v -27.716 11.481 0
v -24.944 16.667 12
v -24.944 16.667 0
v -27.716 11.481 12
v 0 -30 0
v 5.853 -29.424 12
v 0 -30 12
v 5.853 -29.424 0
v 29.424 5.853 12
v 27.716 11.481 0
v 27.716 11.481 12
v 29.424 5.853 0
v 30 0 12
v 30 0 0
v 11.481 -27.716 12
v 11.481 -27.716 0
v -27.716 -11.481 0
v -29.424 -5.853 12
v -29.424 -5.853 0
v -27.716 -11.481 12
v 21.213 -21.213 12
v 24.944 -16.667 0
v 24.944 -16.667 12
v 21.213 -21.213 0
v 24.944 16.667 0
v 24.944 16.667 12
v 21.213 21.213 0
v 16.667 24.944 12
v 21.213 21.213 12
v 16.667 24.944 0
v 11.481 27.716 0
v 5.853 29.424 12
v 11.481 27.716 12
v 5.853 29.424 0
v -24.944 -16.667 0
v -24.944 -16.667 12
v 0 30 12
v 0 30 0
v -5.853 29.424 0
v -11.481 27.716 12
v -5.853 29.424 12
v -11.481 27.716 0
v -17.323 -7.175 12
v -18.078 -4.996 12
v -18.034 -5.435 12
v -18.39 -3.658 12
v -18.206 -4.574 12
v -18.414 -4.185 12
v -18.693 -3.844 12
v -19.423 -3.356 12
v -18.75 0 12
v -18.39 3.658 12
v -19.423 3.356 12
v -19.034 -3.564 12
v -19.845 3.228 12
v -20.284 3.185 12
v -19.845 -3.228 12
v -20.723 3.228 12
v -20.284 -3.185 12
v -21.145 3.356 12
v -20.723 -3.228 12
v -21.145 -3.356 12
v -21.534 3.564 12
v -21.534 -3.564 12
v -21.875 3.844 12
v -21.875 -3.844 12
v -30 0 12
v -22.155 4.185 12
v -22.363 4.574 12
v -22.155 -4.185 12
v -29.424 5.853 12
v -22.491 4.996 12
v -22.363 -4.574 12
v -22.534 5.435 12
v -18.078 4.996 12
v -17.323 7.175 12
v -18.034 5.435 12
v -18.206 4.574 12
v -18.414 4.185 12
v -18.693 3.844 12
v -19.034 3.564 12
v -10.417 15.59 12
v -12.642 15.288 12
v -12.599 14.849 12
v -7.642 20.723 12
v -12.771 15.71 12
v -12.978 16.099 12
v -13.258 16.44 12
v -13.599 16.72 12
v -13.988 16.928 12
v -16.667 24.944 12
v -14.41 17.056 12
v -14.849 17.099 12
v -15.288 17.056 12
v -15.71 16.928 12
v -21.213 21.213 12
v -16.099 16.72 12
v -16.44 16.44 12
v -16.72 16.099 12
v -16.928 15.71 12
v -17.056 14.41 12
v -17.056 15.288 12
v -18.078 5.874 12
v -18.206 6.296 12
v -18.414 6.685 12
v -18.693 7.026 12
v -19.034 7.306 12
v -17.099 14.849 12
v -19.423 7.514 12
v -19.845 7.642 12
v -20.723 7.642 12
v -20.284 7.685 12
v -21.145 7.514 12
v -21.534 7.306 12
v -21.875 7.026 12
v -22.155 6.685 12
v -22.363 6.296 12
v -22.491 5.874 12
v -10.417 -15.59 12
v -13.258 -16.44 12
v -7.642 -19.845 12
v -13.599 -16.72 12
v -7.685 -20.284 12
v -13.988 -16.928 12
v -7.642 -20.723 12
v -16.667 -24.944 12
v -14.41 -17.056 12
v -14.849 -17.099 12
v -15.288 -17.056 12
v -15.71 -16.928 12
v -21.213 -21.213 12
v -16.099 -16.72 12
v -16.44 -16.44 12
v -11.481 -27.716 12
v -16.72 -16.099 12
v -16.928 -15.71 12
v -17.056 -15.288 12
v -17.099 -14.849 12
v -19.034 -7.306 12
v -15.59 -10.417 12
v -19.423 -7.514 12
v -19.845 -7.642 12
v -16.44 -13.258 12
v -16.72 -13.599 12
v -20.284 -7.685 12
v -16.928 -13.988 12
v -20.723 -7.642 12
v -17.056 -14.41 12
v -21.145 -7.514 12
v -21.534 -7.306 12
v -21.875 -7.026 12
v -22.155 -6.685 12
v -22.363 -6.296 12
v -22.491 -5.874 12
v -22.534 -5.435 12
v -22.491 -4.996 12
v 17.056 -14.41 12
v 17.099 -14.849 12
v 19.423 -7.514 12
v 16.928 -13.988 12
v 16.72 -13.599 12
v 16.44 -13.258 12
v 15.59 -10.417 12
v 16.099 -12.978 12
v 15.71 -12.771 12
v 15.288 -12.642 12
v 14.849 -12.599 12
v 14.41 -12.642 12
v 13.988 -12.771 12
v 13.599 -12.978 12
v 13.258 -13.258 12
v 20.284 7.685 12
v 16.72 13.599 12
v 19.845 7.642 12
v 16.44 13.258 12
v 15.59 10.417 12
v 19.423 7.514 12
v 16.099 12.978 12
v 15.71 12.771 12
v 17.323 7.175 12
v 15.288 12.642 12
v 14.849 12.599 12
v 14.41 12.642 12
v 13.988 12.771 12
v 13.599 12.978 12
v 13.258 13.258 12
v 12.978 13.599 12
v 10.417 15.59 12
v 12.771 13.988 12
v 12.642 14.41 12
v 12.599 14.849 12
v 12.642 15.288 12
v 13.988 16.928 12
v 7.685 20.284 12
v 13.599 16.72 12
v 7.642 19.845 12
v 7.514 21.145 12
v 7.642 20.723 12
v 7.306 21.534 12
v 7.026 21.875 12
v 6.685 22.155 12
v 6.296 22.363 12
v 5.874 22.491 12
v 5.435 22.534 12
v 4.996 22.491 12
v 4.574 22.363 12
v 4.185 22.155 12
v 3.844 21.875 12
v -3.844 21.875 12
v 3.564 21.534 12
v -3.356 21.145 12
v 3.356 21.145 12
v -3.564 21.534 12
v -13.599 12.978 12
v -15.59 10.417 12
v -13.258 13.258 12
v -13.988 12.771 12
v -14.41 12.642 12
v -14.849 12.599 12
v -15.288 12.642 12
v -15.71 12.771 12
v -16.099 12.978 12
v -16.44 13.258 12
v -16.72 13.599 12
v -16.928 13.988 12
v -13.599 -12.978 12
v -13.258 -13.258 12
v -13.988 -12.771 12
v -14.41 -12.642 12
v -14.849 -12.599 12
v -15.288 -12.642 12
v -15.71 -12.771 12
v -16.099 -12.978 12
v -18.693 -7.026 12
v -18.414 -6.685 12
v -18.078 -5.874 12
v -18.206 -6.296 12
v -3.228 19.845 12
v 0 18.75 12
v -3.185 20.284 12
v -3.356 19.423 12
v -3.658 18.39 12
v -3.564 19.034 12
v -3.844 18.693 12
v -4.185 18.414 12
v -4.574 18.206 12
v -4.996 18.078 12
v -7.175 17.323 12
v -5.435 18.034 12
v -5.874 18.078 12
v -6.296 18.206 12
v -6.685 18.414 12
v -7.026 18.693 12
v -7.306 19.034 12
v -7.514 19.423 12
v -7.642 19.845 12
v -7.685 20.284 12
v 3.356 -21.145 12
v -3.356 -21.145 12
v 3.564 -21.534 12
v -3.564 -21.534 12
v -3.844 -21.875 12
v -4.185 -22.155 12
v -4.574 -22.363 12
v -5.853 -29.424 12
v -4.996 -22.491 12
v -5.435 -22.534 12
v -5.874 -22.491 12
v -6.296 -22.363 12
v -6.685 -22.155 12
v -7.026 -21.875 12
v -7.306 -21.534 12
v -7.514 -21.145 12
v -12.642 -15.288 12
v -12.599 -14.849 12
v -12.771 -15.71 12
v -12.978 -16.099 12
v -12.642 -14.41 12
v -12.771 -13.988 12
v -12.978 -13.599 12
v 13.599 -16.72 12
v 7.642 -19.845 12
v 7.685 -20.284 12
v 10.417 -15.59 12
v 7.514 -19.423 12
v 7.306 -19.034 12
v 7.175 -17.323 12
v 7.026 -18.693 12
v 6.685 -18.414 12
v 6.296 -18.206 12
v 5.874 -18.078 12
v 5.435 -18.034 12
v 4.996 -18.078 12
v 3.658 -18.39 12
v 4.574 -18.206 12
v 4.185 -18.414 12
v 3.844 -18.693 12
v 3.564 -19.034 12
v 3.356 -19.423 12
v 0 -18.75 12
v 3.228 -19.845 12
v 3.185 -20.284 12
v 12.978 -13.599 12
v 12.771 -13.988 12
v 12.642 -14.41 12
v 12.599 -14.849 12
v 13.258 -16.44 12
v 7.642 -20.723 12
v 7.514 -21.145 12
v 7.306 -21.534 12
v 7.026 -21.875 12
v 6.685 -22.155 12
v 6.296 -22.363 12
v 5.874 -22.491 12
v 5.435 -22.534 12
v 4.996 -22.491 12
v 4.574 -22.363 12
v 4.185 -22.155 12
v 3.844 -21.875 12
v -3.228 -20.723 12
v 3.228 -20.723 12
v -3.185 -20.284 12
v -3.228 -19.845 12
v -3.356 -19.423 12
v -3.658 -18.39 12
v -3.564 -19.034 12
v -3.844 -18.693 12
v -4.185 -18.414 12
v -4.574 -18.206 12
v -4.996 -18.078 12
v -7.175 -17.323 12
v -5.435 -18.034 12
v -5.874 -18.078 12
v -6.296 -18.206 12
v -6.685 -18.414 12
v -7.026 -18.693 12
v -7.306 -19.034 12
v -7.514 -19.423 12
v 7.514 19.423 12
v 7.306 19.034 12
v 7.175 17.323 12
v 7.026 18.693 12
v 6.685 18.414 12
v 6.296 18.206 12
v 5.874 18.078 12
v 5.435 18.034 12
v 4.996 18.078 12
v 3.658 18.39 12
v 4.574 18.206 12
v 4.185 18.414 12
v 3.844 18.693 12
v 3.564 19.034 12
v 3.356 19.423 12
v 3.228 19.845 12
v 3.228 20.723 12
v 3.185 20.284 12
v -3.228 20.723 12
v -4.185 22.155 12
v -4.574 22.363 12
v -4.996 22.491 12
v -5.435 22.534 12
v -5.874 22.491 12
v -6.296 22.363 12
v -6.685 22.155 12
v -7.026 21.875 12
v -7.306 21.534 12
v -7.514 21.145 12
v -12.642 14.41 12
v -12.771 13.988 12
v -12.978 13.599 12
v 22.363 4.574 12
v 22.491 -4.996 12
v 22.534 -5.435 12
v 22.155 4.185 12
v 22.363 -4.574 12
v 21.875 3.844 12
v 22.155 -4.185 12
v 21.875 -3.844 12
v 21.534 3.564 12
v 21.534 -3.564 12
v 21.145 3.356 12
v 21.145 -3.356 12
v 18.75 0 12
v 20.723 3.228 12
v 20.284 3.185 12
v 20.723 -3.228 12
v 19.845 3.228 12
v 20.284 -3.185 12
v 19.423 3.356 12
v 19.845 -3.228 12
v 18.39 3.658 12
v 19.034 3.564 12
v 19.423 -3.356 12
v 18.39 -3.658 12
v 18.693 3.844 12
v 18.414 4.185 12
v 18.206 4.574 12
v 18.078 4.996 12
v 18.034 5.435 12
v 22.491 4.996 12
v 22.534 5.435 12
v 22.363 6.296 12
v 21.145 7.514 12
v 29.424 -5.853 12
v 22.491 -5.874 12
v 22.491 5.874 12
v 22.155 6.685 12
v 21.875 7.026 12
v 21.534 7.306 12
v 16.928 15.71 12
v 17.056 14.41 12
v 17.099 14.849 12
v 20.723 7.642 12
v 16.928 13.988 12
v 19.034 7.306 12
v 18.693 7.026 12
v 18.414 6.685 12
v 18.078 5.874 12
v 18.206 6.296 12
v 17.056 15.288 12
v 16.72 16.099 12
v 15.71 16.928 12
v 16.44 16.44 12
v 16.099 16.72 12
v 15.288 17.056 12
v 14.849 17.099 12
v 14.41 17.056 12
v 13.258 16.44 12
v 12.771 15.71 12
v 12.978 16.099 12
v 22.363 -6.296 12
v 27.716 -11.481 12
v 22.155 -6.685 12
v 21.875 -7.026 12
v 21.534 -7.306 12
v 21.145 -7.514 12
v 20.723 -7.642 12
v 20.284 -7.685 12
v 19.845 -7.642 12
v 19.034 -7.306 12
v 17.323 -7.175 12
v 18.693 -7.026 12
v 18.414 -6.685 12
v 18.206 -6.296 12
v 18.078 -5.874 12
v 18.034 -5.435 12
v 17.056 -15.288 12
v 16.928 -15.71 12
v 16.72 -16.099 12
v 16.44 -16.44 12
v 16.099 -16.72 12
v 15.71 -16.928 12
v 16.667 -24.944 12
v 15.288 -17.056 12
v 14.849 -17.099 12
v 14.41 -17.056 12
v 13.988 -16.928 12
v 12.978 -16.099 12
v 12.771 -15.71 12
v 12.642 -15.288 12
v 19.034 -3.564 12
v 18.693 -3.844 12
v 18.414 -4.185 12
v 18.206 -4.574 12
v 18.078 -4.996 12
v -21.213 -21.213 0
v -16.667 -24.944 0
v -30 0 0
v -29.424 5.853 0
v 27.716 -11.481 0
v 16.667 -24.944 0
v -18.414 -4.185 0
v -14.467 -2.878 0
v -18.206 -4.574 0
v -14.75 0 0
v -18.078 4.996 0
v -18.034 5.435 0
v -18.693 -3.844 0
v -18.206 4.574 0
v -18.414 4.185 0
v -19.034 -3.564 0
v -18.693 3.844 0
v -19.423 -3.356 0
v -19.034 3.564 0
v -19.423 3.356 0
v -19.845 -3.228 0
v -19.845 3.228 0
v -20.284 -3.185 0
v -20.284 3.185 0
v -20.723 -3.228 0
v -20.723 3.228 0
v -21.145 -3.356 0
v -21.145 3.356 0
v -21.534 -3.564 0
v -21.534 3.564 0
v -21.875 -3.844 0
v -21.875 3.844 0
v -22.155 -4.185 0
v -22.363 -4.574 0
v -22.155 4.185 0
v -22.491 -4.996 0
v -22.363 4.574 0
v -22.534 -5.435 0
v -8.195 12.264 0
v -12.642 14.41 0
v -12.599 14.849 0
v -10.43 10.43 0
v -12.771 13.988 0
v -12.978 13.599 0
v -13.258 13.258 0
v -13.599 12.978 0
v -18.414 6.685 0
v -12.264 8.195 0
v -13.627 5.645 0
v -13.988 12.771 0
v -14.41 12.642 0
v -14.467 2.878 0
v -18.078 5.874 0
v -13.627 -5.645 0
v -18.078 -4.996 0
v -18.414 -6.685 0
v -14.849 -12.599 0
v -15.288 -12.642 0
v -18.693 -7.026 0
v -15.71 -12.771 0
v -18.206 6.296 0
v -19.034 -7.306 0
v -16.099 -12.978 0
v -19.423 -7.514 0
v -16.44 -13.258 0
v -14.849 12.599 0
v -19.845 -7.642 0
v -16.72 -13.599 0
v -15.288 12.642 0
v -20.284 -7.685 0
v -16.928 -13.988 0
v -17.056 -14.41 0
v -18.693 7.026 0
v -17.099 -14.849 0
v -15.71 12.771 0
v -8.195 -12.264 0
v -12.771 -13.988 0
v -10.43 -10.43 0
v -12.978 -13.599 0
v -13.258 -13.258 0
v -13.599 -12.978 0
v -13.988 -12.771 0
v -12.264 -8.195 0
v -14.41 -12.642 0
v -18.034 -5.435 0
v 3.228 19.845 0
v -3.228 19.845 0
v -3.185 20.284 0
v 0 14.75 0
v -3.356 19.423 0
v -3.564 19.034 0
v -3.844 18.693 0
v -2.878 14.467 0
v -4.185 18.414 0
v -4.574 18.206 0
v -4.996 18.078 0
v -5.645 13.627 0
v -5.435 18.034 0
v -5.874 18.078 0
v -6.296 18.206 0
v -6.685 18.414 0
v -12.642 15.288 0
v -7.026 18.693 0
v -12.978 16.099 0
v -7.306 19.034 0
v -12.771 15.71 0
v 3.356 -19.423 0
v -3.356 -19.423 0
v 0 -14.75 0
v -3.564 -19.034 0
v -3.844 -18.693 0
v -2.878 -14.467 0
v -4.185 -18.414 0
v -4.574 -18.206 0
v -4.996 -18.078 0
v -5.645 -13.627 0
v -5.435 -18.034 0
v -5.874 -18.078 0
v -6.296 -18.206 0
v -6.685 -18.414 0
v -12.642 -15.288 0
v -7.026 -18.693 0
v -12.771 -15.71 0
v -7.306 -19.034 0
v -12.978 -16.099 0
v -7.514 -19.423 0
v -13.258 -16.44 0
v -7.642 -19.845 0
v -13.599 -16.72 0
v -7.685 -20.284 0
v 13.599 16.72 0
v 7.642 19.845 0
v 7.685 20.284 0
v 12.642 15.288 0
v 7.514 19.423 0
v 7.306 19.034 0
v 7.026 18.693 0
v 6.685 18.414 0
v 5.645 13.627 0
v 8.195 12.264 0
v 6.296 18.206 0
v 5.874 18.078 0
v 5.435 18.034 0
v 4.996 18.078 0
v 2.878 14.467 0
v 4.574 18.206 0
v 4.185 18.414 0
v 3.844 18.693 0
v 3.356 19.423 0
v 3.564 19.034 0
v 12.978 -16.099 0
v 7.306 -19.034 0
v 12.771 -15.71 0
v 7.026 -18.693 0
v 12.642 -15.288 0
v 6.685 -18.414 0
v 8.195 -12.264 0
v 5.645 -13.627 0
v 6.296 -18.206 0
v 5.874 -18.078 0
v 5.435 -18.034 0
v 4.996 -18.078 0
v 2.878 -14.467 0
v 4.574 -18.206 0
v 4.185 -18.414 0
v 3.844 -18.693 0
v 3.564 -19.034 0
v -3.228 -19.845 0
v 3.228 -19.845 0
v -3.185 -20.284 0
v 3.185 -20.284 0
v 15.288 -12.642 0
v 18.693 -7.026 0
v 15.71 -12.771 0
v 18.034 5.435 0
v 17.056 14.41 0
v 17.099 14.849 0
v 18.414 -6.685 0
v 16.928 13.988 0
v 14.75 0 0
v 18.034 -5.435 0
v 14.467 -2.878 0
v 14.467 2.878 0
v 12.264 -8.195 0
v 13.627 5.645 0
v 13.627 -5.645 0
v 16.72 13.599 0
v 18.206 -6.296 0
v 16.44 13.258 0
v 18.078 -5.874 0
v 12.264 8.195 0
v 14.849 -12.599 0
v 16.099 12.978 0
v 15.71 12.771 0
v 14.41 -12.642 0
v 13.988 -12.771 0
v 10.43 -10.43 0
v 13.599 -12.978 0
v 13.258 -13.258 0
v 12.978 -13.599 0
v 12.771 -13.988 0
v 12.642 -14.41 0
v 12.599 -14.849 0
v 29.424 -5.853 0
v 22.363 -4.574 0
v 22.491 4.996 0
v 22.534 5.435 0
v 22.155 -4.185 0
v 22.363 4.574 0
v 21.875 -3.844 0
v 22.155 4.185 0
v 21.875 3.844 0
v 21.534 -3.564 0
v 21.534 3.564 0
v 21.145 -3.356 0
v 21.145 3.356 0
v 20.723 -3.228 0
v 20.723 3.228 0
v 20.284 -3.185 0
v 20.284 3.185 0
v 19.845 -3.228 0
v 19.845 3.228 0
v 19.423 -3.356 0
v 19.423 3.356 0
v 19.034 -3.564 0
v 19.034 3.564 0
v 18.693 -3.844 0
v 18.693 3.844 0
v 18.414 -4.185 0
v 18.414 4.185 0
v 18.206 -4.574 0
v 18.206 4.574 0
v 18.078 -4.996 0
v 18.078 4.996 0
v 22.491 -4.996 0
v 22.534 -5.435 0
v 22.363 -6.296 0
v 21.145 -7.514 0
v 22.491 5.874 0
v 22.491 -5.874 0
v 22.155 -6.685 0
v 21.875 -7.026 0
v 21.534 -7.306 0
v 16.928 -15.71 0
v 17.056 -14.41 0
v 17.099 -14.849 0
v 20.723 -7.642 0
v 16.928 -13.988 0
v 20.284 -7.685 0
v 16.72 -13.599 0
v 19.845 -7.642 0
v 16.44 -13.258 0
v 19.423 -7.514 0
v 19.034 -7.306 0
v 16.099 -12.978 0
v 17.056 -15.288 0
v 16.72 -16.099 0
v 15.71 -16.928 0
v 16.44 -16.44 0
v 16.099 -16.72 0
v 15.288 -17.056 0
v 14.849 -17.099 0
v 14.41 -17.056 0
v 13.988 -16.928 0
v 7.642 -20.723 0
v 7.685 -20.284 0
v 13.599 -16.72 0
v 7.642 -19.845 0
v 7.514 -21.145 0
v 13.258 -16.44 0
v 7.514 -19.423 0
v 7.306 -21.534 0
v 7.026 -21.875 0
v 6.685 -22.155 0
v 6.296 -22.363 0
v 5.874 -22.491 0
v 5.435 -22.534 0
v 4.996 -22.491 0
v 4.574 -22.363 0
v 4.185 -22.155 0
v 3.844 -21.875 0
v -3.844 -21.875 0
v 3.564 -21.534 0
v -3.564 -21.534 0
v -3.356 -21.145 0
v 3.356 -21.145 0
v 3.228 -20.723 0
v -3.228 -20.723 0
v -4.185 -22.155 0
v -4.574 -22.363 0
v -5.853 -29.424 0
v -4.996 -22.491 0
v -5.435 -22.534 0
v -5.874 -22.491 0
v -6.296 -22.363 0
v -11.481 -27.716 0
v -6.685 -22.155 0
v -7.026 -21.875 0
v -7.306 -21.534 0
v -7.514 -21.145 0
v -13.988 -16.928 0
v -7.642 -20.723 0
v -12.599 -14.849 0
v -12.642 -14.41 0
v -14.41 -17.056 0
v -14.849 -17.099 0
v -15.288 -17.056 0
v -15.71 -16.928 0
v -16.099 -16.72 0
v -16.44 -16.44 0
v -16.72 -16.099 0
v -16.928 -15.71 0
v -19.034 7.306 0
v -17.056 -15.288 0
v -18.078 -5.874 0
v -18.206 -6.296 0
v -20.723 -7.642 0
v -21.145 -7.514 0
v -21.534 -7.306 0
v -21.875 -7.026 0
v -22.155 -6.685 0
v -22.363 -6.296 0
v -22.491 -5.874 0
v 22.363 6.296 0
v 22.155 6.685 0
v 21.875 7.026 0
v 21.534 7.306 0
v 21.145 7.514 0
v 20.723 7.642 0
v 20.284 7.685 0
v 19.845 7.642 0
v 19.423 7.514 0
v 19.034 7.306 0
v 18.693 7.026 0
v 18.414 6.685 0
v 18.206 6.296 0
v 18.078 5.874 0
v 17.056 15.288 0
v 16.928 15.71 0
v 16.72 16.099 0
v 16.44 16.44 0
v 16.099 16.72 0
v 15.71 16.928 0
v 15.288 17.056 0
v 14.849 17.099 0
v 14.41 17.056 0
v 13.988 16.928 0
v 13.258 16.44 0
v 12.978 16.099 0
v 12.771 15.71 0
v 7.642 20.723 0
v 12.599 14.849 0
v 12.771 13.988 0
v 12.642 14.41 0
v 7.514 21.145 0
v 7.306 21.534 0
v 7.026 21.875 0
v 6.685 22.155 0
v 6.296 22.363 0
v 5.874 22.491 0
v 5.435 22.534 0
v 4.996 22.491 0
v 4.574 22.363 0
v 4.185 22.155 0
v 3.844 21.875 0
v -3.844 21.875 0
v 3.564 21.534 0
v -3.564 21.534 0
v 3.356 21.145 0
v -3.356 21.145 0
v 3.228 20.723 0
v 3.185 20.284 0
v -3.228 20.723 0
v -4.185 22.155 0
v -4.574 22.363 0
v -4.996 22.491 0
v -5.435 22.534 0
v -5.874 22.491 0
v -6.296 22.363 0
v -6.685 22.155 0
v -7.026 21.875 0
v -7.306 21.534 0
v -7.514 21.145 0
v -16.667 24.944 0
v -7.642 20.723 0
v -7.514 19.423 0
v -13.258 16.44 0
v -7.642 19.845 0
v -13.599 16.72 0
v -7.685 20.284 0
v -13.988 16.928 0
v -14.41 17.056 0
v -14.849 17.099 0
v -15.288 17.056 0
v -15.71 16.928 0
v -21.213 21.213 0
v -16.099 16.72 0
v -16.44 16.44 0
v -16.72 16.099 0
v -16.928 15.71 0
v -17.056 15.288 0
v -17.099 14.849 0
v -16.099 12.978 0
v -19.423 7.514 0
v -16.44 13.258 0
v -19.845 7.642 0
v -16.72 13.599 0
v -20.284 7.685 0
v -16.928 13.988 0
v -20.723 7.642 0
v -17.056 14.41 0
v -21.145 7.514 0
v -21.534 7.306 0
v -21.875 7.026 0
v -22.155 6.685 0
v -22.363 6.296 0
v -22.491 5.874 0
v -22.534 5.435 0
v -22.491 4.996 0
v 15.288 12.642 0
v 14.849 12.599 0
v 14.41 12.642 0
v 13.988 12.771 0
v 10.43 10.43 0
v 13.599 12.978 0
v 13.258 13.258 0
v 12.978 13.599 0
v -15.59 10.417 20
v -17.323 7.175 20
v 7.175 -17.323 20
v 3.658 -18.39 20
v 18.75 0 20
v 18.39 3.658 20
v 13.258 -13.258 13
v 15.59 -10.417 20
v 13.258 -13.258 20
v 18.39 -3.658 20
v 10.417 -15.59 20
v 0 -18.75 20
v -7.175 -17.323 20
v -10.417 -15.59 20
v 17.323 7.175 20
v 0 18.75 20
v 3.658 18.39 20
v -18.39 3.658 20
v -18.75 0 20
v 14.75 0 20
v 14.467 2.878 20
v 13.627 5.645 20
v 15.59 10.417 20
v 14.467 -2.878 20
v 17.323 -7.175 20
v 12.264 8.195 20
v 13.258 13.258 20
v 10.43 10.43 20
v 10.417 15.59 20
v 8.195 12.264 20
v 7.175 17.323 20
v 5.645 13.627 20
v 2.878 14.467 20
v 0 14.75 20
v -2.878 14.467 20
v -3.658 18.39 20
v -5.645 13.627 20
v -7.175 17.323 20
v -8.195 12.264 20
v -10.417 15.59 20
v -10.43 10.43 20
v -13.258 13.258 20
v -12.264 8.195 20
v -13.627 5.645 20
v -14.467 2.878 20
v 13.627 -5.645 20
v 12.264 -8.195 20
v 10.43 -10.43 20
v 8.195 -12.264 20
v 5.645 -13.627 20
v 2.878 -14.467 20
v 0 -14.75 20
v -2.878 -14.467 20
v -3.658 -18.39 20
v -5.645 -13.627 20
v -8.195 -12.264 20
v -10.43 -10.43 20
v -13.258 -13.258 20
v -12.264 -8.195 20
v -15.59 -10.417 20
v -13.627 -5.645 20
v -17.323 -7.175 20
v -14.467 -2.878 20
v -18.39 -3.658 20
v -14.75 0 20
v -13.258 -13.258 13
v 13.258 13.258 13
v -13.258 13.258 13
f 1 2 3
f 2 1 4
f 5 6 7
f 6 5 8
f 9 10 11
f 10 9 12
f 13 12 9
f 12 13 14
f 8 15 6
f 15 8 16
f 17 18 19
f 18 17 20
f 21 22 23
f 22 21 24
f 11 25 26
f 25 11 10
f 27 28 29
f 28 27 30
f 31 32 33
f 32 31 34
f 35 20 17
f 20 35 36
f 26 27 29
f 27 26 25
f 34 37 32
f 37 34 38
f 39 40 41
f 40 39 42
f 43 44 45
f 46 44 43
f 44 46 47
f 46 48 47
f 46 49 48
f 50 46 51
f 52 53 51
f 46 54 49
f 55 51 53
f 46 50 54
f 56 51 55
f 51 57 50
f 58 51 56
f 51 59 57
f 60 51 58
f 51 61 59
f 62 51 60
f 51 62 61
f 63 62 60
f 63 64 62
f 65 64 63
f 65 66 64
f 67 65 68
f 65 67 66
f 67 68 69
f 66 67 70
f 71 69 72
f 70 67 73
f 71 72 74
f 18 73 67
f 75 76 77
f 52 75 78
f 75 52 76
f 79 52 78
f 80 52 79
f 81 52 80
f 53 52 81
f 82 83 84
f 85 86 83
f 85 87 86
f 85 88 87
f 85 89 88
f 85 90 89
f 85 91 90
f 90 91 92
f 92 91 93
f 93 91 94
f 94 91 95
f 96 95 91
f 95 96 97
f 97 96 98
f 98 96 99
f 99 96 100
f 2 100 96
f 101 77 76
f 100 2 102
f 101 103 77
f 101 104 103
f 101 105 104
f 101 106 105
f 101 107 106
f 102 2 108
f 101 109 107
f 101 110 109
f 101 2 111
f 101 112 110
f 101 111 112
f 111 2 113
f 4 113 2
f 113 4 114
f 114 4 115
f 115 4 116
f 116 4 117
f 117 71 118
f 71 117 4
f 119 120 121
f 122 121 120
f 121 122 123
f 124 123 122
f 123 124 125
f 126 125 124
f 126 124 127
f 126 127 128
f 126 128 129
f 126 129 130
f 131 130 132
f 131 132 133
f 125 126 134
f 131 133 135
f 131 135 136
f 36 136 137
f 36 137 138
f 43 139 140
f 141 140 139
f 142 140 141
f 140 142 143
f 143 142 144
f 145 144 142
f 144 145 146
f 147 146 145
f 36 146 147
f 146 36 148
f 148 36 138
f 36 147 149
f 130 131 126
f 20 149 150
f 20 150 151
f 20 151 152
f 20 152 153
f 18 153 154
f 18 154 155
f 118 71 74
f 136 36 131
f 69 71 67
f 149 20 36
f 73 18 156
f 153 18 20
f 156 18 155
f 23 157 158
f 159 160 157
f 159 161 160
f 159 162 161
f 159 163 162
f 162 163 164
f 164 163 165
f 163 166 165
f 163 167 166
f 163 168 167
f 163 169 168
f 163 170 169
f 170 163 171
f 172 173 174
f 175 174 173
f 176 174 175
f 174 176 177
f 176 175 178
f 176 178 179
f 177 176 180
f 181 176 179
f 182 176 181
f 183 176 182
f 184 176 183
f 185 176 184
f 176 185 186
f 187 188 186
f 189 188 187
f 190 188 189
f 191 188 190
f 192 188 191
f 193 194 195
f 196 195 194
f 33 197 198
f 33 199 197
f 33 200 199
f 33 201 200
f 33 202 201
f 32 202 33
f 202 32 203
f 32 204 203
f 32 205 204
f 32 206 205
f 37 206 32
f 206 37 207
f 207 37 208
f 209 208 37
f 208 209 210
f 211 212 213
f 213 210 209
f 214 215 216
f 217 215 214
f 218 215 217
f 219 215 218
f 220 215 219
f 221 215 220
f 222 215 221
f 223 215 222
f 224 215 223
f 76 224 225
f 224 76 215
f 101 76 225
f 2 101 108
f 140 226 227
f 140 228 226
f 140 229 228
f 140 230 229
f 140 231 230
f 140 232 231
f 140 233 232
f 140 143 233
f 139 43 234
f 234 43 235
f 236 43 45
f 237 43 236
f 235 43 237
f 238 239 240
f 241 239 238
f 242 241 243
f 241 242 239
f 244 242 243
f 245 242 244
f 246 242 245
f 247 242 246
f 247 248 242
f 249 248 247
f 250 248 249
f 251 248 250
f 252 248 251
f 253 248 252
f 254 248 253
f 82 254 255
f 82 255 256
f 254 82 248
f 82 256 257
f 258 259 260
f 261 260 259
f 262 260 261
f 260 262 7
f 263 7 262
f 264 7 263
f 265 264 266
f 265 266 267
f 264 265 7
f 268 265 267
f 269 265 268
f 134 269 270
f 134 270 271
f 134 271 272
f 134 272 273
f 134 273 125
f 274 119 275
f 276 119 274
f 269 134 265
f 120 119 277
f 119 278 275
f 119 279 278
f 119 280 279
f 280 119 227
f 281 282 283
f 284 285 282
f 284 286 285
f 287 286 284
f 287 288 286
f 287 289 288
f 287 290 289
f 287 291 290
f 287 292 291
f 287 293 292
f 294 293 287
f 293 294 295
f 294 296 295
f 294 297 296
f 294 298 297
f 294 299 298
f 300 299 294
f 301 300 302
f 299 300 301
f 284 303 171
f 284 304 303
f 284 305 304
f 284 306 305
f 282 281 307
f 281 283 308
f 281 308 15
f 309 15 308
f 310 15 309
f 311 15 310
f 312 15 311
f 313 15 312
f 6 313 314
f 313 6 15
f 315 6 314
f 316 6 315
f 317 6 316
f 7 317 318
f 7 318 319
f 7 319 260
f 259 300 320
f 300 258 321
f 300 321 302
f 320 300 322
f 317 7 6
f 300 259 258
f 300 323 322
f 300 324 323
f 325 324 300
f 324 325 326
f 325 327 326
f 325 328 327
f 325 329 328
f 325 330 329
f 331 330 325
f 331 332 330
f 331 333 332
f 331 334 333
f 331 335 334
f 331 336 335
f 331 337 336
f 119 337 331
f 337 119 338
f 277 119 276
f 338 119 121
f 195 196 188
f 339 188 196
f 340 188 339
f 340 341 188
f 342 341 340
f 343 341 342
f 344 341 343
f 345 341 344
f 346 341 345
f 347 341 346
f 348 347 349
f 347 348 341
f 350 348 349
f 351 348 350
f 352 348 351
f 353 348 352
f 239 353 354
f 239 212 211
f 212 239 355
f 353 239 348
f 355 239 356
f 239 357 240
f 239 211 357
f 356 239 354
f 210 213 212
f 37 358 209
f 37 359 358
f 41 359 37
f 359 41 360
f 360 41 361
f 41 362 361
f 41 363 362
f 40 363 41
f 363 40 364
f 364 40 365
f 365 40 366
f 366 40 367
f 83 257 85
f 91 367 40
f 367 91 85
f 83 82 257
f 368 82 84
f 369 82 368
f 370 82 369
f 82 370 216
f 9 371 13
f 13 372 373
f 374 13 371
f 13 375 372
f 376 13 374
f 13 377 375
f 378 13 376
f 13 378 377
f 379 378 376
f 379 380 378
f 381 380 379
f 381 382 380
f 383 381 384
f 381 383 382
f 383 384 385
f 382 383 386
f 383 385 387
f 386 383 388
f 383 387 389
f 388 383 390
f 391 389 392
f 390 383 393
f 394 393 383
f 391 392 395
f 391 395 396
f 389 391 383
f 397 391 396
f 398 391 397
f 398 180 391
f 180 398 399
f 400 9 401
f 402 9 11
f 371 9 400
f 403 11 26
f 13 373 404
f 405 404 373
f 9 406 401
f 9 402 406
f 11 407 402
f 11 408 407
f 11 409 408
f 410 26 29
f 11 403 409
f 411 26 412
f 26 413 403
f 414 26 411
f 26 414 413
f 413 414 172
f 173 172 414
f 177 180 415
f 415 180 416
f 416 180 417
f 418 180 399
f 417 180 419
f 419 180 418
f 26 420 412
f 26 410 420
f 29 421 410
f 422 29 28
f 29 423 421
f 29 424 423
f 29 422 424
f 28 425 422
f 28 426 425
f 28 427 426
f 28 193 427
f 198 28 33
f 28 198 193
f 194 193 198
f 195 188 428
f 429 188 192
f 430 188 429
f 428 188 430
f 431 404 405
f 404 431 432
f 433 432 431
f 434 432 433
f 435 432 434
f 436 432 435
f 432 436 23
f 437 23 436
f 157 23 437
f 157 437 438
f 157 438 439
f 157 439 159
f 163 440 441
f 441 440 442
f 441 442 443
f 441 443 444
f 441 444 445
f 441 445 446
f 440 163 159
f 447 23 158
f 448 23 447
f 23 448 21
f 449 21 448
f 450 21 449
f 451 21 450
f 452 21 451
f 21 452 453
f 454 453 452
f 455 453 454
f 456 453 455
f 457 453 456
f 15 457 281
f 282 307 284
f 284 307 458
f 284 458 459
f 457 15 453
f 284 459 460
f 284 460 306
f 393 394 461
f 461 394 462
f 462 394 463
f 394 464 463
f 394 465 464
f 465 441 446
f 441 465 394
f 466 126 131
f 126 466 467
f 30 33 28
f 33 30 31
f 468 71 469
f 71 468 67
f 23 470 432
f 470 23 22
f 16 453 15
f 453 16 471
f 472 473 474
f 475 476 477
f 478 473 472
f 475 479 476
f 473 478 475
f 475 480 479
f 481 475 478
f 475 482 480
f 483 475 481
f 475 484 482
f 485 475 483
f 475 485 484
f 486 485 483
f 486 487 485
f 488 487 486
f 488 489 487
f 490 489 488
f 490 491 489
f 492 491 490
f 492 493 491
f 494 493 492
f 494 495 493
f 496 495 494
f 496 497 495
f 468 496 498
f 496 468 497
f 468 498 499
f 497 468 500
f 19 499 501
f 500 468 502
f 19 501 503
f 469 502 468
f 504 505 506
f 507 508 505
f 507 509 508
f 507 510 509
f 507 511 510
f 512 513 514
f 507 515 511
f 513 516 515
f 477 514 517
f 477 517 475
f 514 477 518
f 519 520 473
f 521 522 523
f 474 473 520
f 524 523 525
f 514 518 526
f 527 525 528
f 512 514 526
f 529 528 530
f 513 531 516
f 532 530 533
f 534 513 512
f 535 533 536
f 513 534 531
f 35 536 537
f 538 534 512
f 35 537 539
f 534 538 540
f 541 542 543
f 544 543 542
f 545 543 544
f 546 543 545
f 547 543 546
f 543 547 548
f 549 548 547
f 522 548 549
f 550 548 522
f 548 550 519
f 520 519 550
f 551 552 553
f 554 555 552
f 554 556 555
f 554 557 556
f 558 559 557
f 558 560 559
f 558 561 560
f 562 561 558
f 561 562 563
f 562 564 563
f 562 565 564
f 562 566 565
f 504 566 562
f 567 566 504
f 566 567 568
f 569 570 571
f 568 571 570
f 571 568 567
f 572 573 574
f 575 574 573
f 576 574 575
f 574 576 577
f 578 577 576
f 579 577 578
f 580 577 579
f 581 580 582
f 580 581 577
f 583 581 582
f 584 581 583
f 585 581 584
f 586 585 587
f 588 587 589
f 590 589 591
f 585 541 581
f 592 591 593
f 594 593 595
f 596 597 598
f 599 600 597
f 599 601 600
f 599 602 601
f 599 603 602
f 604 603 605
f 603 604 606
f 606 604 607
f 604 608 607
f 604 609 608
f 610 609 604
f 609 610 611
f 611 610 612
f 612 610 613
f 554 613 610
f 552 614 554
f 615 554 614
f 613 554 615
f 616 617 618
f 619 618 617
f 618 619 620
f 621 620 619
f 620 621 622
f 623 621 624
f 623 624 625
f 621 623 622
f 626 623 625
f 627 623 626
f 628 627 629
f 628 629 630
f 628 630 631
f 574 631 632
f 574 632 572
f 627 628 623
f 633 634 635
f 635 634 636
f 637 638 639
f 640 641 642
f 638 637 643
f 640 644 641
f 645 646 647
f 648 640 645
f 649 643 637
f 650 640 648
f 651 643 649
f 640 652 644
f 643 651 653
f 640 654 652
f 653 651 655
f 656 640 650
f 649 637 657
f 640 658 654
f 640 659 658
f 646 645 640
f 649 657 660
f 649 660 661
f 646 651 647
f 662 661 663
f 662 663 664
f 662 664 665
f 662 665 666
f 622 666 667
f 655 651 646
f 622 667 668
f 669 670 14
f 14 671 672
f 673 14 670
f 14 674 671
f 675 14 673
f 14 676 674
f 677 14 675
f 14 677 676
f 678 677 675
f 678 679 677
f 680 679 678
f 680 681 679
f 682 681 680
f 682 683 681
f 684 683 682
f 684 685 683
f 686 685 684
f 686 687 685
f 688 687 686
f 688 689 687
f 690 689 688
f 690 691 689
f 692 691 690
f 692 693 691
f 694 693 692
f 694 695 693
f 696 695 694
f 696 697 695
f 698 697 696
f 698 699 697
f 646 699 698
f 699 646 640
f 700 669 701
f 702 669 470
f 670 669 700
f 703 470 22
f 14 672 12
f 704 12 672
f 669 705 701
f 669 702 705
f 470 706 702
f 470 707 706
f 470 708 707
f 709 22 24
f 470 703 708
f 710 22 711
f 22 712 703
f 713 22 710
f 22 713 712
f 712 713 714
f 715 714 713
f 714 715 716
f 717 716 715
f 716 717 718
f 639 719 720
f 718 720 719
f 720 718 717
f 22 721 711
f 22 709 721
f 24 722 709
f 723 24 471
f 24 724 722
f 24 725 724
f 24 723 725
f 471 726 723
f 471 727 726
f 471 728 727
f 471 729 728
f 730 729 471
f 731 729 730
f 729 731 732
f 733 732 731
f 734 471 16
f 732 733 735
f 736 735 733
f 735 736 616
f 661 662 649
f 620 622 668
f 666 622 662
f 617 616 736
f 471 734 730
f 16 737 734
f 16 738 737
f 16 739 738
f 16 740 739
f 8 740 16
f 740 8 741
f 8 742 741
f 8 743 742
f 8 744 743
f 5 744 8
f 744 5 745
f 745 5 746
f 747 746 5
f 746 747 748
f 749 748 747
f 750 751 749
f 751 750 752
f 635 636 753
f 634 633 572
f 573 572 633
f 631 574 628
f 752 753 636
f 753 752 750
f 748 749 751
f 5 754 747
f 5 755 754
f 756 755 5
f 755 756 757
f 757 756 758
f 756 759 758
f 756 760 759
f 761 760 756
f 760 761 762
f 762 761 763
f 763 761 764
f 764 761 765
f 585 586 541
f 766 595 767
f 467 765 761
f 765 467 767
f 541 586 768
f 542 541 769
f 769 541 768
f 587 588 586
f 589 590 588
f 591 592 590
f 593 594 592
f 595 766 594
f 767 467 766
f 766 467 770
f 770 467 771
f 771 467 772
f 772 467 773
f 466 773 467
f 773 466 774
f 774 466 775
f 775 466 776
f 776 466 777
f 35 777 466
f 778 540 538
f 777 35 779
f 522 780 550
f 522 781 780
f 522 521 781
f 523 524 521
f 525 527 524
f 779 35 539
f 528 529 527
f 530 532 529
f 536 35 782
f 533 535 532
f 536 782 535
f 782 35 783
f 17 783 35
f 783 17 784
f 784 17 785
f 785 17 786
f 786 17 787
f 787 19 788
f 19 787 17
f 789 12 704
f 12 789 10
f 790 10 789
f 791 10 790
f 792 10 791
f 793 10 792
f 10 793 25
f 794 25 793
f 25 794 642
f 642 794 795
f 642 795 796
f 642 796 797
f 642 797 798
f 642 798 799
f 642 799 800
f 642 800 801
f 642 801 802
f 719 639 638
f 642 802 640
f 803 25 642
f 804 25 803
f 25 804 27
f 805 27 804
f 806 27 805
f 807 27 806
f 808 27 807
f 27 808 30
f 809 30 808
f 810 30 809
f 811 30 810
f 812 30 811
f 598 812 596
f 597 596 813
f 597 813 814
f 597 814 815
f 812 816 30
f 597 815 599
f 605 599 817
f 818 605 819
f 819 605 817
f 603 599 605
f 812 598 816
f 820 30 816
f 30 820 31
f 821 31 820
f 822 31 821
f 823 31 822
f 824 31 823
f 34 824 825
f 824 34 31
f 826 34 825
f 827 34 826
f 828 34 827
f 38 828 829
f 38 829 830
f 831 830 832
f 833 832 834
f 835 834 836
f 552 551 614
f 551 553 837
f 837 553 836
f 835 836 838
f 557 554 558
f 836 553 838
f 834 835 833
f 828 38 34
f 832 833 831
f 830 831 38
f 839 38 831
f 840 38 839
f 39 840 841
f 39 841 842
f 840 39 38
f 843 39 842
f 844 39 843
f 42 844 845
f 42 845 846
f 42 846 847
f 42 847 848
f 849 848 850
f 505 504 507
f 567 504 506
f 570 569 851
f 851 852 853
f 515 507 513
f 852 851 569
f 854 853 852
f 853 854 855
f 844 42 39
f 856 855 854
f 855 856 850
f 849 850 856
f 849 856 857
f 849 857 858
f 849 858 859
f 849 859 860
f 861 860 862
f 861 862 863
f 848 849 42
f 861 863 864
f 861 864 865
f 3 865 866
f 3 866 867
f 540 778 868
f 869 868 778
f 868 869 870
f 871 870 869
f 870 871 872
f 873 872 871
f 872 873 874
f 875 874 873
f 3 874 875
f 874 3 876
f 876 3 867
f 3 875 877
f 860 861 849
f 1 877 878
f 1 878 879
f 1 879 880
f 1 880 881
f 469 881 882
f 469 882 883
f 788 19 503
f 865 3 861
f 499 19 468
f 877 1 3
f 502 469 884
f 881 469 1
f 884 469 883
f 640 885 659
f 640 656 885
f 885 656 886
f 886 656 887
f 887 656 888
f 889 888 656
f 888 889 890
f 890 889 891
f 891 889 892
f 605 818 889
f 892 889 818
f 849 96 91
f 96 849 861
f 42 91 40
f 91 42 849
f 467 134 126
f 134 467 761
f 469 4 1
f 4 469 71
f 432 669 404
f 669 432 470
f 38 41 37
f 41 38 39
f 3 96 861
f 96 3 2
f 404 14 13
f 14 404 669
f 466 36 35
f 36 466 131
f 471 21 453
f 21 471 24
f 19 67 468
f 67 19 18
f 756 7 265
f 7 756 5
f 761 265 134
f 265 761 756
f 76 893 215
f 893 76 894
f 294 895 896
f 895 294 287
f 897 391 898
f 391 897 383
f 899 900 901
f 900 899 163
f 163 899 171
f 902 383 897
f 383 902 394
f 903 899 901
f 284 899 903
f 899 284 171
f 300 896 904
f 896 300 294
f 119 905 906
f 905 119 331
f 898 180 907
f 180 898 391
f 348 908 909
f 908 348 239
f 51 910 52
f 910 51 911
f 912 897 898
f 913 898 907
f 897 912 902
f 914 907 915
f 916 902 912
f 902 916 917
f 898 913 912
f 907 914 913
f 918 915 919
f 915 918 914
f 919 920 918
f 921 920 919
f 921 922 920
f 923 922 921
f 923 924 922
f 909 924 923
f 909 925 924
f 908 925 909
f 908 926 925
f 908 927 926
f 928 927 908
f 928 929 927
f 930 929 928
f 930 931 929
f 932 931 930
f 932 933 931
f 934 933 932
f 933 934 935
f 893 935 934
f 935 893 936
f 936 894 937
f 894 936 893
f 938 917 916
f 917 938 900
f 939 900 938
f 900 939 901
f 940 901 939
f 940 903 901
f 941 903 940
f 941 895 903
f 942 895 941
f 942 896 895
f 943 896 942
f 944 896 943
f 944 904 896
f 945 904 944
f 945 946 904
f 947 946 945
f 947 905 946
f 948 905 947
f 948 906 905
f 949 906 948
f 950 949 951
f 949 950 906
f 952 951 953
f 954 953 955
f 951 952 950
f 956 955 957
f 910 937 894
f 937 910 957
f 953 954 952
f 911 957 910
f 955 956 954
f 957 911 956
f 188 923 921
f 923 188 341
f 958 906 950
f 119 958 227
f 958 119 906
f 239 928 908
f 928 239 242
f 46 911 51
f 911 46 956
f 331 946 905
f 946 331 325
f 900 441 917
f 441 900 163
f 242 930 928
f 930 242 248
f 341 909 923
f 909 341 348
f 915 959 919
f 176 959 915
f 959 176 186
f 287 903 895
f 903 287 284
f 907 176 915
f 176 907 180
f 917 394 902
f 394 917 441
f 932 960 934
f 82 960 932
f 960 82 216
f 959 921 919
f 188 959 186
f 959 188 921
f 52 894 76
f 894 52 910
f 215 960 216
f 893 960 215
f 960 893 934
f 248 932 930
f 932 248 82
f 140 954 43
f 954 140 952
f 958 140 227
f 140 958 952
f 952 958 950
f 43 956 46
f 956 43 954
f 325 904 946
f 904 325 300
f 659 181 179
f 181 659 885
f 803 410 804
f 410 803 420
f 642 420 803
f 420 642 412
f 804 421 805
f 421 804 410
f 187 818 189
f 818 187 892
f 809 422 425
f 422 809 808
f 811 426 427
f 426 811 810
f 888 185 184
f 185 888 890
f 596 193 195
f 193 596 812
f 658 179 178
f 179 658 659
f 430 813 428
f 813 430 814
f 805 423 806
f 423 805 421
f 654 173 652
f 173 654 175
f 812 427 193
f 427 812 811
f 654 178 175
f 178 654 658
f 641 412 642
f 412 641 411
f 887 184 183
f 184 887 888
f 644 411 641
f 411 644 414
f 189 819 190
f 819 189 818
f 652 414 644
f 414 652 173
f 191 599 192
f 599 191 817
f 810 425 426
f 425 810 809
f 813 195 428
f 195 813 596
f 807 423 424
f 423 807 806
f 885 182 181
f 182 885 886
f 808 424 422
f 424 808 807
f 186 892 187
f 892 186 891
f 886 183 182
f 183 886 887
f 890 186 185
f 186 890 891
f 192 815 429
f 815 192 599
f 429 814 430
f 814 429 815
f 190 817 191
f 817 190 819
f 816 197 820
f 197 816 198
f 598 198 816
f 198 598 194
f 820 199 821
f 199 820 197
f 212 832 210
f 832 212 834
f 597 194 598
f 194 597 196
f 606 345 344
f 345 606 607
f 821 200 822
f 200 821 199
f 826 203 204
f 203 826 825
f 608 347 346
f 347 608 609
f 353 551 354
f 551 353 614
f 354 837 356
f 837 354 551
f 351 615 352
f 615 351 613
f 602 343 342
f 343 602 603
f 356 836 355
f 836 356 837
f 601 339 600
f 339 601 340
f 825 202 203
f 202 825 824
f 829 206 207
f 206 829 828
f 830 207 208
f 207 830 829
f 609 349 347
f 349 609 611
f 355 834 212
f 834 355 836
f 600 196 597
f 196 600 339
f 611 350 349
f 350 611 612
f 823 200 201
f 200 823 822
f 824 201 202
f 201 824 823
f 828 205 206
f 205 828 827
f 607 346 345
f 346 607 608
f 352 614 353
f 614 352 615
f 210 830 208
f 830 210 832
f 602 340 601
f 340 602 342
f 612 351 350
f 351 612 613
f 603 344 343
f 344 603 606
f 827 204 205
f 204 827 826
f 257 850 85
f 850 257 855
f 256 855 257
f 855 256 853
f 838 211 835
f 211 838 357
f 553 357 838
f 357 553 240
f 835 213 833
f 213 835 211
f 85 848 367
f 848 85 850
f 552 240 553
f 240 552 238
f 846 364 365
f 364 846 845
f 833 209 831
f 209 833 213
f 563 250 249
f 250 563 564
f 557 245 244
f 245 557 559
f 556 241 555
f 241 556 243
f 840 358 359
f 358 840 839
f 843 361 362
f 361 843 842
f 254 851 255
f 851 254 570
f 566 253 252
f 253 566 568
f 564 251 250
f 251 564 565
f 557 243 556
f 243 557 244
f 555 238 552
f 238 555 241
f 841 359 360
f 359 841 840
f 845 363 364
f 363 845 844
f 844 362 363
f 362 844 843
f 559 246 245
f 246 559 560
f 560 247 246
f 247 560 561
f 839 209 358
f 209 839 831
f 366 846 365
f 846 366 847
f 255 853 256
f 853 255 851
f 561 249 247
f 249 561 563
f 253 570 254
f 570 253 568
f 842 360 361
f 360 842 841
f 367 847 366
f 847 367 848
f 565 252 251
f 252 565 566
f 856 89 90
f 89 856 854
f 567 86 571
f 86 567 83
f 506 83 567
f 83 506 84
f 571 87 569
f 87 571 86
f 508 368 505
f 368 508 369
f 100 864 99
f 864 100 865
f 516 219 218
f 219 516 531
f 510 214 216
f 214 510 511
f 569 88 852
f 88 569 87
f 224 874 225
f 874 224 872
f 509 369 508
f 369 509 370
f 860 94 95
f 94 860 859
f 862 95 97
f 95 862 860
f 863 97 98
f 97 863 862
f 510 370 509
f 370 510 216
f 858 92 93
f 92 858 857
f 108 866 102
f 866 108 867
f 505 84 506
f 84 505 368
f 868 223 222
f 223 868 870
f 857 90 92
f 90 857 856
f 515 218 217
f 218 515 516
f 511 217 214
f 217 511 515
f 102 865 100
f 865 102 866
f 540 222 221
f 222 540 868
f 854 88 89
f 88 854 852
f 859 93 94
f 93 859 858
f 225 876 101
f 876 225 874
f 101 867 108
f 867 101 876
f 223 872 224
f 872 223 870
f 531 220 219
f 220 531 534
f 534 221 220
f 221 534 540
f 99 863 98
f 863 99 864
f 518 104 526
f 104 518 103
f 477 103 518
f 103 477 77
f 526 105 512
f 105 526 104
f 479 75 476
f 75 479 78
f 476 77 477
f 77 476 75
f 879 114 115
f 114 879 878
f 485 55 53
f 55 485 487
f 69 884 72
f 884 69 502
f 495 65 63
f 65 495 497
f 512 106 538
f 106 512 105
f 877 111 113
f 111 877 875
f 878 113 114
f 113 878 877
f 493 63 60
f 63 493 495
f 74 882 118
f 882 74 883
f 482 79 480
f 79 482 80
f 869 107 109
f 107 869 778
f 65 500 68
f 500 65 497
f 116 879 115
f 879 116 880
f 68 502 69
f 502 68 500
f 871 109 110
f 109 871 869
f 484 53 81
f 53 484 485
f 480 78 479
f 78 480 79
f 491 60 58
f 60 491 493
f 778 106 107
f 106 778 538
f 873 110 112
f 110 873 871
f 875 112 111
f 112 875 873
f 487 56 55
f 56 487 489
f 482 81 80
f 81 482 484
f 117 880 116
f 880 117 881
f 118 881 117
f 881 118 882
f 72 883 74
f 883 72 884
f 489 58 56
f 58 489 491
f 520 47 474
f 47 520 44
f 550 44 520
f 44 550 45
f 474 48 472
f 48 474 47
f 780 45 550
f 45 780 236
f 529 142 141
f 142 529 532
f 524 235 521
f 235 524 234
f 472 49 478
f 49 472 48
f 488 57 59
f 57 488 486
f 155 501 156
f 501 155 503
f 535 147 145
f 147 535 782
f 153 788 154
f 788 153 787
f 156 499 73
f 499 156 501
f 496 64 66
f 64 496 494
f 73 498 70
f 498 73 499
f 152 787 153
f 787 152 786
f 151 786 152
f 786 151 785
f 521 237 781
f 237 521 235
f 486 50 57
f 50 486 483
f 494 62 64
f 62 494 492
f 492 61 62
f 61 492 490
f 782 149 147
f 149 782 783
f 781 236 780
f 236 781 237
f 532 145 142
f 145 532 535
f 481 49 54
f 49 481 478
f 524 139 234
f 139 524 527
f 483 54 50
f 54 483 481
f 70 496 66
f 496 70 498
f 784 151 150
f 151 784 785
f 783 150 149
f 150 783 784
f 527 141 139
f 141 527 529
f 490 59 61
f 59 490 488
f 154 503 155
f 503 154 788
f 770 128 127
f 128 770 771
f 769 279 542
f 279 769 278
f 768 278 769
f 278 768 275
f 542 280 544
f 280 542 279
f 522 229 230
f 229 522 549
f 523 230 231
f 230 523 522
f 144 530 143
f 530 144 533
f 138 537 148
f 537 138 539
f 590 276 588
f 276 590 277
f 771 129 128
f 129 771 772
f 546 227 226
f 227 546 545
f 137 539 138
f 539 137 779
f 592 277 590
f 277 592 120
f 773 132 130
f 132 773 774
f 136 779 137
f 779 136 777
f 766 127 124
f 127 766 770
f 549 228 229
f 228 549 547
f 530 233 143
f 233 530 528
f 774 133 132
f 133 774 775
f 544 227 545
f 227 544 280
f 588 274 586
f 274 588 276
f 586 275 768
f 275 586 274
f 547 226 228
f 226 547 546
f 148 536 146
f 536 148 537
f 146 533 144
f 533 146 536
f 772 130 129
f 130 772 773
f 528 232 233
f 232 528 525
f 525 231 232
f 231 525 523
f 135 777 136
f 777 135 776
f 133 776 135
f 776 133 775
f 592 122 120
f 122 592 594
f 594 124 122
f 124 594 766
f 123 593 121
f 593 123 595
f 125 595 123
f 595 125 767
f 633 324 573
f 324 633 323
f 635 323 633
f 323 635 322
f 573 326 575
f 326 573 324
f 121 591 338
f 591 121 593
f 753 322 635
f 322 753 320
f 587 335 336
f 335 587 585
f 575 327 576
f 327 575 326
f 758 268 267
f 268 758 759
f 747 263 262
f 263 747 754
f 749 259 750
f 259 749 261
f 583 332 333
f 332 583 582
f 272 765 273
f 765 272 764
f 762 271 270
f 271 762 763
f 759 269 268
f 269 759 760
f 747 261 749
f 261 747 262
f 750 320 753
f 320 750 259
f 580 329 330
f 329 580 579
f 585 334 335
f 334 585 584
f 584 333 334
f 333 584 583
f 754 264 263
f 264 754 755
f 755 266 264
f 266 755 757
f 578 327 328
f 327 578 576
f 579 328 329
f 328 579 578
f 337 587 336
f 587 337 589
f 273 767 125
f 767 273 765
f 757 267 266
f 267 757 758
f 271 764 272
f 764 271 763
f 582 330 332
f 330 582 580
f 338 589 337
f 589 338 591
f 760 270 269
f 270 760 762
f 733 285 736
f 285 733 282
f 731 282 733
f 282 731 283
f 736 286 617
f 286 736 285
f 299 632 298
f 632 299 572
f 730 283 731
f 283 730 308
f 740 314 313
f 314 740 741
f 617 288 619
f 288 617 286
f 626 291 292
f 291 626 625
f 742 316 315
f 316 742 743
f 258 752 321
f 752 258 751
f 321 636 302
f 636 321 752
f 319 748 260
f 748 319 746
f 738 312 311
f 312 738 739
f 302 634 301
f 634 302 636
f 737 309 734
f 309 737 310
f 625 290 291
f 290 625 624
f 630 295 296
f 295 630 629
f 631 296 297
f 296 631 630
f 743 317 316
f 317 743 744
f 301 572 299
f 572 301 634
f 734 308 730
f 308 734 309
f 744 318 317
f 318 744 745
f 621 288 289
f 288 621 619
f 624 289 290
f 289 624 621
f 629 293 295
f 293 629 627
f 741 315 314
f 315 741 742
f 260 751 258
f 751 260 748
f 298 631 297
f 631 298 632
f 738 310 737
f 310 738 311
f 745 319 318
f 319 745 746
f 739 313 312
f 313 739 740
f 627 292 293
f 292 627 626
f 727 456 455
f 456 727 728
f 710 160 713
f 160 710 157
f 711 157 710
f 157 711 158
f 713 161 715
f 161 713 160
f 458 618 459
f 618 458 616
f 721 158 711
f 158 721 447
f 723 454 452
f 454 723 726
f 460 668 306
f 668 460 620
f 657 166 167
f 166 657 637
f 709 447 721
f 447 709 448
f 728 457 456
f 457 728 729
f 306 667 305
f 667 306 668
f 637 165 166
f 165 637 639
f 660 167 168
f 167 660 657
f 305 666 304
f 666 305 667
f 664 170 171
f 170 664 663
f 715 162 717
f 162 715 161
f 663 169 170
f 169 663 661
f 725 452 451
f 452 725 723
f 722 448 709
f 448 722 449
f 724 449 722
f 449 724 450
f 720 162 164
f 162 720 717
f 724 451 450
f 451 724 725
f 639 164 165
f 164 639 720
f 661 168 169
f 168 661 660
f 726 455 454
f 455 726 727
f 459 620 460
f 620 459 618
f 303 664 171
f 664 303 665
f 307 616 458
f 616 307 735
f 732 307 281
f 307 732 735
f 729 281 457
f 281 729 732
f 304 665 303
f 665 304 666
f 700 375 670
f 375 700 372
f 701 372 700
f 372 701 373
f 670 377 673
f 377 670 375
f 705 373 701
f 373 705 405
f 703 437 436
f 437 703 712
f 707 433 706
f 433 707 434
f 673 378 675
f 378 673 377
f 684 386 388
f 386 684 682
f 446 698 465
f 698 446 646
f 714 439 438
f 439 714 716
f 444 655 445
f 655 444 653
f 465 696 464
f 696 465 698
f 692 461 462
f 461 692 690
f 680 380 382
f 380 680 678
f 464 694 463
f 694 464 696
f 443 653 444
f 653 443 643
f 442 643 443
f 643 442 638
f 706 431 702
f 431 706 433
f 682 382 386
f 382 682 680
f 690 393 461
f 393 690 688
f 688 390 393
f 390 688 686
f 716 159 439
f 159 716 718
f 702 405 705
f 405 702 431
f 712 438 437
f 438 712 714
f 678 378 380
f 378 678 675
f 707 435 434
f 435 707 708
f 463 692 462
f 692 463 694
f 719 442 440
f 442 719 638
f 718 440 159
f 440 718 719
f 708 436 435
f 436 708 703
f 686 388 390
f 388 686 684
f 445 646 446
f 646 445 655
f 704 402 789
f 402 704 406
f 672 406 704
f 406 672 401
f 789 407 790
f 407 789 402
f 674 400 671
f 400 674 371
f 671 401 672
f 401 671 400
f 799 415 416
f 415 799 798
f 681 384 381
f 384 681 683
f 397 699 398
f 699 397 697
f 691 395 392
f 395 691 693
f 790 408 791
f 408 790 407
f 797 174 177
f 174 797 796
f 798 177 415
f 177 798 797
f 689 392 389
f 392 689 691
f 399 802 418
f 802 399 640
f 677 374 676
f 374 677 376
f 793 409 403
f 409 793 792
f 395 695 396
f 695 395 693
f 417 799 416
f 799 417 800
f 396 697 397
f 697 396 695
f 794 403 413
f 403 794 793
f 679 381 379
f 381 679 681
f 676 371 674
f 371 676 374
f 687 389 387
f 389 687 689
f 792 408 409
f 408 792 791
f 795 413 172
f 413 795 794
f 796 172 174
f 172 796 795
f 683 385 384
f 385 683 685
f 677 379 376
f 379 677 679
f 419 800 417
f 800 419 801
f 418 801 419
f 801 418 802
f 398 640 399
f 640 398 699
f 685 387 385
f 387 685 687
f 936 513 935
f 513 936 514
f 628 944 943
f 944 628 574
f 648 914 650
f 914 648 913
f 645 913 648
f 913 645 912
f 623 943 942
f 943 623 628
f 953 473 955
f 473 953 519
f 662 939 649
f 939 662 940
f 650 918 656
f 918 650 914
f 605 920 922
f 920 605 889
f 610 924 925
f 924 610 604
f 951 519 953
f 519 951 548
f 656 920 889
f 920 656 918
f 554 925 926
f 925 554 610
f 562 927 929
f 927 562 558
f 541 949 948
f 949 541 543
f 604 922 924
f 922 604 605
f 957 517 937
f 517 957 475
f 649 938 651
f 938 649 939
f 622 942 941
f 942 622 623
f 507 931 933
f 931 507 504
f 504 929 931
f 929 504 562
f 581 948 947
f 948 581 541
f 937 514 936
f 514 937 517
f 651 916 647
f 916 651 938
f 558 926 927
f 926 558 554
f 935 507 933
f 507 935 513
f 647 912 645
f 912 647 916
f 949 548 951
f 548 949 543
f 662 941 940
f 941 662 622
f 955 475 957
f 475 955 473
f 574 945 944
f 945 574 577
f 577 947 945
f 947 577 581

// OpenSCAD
$fn = 32;

// ----------------------------------------------------------------------
// Flange Ø60 x 12
// 12 holes on a Ø42 bolt circle, bolted joints
// ----------------------------------------------------------------------

// --- parameters (mm) ---
flange_d = 60;   // outside diameter of the flange
thickness = 12;  // flange thickness
holes = 12;      // number of bolt holes
pcd = 42;        // bolt circle diameter
start_deg = 45;  // angle of the first hole, from +X
hole_d = 4.5;    // bolt hole diameter
bore_d = 29.5;   // central through bore
hub_d = 37.5;    // hub outside diameter
hub_h = 8;       // hub height above the flange face (0 = no hub)

// --- derived feature positions (mm) ---
height = thickness + hub_h;  // = 20   overall height of the part
pcd_r = pcd / 2;             // = 21   bolt circle radius
hole_step = 360 / holes;     // = 30   angular pitch
feature_centers = [
  [pcd_r * cos(start_deg + 0 * hole_step), pcd_r * sin(start_deg + 0 * hole_step)],
  [pcd_r * cos(start_deg + 1 * hole_step), pcd_r * sin(start_deg + 1 * hole_step)],
  [pcd_r * cos(start_deg + 2 * hole_step), pcd_r * sin(start_deg + 2 * hole_step)],
  [pcd_r * cos(start_deg + 3 * hole_step), pcd_r * sin(start_deg + 3 * hole_step)],
  [pcd_r * cos(start_deg + 4 * hole_step), pcd_r * sin(start_deg + 4 * hole_step)],
  [pcd_r * cos(start_deg + 5 * hole_step), pcd_r * sin(start_deg + 5 * hole_step)],
  [pcd_r * cos(start_deg + 6 * hole_step), pcd_r * sin(start_deg + 6 * hole_step)],
  [pcd_r * cos(start_deg + 7 * hole_step), pcd_r * sin(start_deg + 7 * hole_step)],
  [pcd_r * cos(start_deg + 8 * hole_step), pcd_r * sin(start_deg + 8 * hole_step)],
  [pcd_r * cos(start_deg + 9 * hole_step), pcd_r * sin(start_deg + 9 * hole_step)],
  [pcd_r * cos(start_deg + 10 * hole_step), pcd_r * sin(start_deg + 10 * hole_step)],
  [pcd_r * cos(start_deg + 11 * hole_step), pcd_r * sin(start_deg + 11 * hole_step)]
];   // bolt hole centres on the pitch circle

// flange disc, every hole and the bore cut straight through
difference() {
  union() {
    cylinder(d = flange_d, h = thickness);
    cylinder(d = hub_d, h = height);  // hub, overlapped into the flange
  }
  translate([0, 0, -1]) cylinder(d = bore_d, h = height + 2);  // bore, through
  for (centre = feature_centers)
    translate([centre[0], centre[1], -1]) cylinder(d = hole_d, h = thickness + 2);
}
